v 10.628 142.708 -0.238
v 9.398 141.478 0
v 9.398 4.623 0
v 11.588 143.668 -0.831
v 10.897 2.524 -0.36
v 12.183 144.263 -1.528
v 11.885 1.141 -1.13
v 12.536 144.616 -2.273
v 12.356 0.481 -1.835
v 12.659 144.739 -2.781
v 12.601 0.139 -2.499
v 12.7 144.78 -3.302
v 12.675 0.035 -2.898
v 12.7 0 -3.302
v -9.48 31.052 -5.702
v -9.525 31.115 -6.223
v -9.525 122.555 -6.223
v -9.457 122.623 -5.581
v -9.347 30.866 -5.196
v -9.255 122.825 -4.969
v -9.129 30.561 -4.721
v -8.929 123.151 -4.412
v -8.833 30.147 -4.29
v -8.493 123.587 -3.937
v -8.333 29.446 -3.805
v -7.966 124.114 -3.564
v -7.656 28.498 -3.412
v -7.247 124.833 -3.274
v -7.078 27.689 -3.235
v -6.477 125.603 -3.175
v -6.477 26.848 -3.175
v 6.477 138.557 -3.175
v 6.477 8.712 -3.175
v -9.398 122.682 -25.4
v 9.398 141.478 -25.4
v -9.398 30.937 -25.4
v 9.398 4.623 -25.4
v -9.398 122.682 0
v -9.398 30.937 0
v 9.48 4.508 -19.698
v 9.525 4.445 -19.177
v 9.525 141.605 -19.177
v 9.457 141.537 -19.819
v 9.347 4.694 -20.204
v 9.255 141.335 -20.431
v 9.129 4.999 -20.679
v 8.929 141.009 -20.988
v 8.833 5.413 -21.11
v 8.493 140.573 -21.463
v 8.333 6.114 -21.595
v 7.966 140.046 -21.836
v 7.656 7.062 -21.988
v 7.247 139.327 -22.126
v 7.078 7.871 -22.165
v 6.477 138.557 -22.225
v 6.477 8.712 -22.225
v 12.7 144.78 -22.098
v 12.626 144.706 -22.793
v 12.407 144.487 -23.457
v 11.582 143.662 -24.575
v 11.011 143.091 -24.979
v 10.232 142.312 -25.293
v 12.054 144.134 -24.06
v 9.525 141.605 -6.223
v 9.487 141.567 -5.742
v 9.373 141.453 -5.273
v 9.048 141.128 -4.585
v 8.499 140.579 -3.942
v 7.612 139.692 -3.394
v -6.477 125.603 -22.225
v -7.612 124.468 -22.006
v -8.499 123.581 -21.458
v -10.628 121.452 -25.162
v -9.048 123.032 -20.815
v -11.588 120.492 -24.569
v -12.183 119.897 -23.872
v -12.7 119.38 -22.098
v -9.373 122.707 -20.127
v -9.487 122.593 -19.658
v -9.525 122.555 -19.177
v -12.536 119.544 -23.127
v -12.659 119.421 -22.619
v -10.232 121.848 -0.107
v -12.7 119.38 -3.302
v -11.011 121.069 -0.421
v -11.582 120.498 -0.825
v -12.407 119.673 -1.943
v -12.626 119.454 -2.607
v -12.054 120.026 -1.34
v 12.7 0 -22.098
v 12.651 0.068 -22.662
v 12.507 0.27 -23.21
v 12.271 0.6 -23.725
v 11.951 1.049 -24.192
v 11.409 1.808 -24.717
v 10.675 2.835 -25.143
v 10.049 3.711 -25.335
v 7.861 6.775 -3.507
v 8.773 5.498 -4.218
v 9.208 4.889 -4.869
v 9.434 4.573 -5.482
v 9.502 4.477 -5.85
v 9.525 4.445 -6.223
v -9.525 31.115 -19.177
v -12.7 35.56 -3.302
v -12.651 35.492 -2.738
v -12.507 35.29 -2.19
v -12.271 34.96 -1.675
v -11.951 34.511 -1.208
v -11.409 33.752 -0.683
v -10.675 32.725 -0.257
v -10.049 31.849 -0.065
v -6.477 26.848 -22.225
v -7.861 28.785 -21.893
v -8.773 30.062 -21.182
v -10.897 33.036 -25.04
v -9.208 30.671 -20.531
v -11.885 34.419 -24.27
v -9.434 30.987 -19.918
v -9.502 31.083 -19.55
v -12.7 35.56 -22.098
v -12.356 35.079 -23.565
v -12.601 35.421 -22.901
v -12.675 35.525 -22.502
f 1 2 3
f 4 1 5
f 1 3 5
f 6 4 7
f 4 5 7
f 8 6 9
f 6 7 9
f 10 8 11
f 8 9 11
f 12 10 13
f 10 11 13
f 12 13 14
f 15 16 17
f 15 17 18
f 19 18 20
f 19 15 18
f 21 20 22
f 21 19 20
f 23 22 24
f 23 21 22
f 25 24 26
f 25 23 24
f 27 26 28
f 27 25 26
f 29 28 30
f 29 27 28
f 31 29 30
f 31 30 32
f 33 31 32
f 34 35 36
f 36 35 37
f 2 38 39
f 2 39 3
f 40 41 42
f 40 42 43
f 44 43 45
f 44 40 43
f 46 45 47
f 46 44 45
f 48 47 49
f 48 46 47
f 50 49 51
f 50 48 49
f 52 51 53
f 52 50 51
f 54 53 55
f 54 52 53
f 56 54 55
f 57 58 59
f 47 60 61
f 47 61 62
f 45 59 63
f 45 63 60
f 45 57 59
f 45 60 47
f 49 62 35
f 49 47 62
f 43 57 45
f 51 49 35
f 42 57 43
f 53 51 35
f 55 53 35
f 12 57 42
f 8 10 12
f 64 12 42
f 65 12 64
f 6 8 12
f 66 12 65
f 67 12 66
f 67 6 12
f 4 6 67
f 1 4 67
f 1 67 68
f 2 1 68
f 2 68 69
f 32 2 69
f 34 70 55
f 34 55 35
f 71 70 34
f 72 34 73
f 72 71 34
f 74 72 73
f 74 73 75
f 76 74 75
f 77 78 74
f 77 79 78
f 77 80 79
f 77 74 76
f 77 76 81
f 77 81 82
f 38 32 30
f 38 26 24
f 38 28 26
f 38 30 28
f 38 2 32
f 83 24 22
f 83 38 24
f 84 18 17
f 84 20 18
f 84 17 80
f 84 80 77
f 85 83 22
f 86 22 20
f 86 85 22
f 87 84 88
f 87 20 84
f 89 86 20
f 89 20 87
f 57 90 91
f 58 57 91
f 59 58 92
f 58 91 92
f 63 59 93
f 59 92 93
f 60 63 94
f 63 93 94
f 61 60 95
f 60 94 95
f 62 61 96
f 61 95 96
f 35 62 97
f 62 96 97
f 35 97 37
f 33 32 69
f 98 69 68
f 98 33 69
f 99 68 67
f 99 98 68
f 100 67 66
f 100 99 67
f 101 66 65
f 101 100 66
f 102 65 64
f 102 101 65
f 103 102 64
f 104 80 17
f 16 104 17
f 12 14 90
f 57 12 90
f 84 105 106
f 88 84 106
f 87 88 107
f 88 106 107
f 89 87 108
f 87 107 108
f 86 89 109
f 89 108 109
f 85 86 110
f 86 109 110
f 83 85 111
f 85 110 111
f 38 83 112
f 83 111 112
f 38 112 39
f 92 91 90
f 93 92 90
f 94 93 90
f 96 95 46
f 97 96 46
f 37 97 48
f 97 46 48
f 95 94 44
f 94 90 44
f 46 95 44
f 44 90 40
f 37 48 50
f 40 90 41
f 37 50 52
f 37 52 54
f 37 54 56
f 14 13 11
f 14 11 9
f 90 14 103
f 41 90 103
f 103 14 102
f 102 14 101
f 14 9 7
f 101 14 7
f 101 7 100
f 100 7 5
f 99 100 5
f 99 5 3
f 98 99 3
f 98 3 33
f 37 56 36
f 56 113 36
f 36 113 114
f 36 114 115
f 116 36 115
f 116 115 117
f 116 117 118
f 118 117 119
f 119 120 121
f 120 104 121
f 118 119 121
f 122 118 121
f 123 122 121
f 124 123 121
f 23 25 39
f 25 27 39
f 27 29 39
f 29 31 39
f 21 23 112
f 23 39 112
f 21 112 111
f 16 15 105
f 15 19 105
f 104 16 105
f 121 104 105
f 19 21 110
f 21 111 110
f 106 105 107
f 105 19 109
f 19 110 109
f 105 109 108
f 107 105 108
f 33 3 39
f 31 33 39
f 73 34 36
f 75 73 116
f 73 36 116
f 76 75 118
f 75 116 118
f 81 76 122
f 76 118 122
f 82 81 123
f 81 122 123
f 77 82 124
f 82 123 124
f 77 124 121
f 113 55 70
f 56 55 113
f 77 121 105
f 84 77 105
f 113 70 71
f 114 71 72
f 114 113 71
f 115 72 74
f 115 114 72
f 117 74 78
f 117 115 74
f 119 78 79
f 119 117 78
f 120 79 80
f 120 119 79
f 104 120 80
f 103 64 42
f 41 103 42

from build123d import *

# Parameters (mm, degrees)
BOSS_EXTRUDE1_DEPTH = 144.78
CUT_EXTRUDE1_DEPTH  = 148.538803032


with BuildPart() as part:
    # Sketch1 → Boss-Extrude1 (new body)
    with BuildSketch(Plane(origin=(0, 0, 0), x_dir=(1, 0, 0), z_dir=(0, 1, 0))):
        with BuildLine():
            Line((-9.398, 0), (9.398, 0))
            ThreePointArc((9.398, 0), (11.732866591, 0.967133409), (12.7, 3.302))
            Line((12.7, 3.302), (12.7, 22.098))
            ThreePointArc((12.7, 22.098), (11.732866591, 24.432866591), (9.398, 25.4))
            Line((9.398, 25.4), (-9.398, 25.4))
            ThreePointArc((-9.398, 25.4), (-11.732866591, 24.432866591), (-12.7, 22.098))
            Line((-12.7, 22.098), (-12.7, 3.302))
            ThreePointArc((-12.7, 3.302), (-11.732866591, 0.967133409), (-9.398, 0))
        make_face()
        with BuildLine():
            Line((-6.477, 3.175), (6.477, 3.175))
            ThreePointArc((6.477, 3.175), (8.632261469, 4.067738531), (9.525, 6.223))
            Line((9.525, 6.223), (9.525, 19.177))
            ThreePointArc((9.525, 19.177), (8.632261469, 21.332261469), (6.477, 22.225))
            Line((6.477, 22.225), (-6.477, 22.225))
            ThreePointArc((-6.477, 22.225), (-8.632261469, 21.332261469), (-9.525, 19.177))
            Line((-9.525, 19.177), (-9.525, 6.223))
            ThreePointArc((-9.525, 6.223), (-8.632261469, 4.067738531), (-6.477, 3.175))
        make_face(mode=Mode.SUBTRACT)
    extrude(amount=BOSS_EXTRUDE1_DEPTH)

    # Sketch2 → Cut-Extrude1 (cut, through all)
    with BuildSketch(Plane.XY):
        Polygon((12.7, 144.78), (-12.7, 119.38), (-12.7, 144.78), align=None)
        Polygon((12.7, 0), (-12.7, 35.56), (-12.7, 0), align=None)
    extrude(amount=-CUT_EXTRUDE1_DEPTH, mode=Mode.SUBTRACT)


solid = part.part
